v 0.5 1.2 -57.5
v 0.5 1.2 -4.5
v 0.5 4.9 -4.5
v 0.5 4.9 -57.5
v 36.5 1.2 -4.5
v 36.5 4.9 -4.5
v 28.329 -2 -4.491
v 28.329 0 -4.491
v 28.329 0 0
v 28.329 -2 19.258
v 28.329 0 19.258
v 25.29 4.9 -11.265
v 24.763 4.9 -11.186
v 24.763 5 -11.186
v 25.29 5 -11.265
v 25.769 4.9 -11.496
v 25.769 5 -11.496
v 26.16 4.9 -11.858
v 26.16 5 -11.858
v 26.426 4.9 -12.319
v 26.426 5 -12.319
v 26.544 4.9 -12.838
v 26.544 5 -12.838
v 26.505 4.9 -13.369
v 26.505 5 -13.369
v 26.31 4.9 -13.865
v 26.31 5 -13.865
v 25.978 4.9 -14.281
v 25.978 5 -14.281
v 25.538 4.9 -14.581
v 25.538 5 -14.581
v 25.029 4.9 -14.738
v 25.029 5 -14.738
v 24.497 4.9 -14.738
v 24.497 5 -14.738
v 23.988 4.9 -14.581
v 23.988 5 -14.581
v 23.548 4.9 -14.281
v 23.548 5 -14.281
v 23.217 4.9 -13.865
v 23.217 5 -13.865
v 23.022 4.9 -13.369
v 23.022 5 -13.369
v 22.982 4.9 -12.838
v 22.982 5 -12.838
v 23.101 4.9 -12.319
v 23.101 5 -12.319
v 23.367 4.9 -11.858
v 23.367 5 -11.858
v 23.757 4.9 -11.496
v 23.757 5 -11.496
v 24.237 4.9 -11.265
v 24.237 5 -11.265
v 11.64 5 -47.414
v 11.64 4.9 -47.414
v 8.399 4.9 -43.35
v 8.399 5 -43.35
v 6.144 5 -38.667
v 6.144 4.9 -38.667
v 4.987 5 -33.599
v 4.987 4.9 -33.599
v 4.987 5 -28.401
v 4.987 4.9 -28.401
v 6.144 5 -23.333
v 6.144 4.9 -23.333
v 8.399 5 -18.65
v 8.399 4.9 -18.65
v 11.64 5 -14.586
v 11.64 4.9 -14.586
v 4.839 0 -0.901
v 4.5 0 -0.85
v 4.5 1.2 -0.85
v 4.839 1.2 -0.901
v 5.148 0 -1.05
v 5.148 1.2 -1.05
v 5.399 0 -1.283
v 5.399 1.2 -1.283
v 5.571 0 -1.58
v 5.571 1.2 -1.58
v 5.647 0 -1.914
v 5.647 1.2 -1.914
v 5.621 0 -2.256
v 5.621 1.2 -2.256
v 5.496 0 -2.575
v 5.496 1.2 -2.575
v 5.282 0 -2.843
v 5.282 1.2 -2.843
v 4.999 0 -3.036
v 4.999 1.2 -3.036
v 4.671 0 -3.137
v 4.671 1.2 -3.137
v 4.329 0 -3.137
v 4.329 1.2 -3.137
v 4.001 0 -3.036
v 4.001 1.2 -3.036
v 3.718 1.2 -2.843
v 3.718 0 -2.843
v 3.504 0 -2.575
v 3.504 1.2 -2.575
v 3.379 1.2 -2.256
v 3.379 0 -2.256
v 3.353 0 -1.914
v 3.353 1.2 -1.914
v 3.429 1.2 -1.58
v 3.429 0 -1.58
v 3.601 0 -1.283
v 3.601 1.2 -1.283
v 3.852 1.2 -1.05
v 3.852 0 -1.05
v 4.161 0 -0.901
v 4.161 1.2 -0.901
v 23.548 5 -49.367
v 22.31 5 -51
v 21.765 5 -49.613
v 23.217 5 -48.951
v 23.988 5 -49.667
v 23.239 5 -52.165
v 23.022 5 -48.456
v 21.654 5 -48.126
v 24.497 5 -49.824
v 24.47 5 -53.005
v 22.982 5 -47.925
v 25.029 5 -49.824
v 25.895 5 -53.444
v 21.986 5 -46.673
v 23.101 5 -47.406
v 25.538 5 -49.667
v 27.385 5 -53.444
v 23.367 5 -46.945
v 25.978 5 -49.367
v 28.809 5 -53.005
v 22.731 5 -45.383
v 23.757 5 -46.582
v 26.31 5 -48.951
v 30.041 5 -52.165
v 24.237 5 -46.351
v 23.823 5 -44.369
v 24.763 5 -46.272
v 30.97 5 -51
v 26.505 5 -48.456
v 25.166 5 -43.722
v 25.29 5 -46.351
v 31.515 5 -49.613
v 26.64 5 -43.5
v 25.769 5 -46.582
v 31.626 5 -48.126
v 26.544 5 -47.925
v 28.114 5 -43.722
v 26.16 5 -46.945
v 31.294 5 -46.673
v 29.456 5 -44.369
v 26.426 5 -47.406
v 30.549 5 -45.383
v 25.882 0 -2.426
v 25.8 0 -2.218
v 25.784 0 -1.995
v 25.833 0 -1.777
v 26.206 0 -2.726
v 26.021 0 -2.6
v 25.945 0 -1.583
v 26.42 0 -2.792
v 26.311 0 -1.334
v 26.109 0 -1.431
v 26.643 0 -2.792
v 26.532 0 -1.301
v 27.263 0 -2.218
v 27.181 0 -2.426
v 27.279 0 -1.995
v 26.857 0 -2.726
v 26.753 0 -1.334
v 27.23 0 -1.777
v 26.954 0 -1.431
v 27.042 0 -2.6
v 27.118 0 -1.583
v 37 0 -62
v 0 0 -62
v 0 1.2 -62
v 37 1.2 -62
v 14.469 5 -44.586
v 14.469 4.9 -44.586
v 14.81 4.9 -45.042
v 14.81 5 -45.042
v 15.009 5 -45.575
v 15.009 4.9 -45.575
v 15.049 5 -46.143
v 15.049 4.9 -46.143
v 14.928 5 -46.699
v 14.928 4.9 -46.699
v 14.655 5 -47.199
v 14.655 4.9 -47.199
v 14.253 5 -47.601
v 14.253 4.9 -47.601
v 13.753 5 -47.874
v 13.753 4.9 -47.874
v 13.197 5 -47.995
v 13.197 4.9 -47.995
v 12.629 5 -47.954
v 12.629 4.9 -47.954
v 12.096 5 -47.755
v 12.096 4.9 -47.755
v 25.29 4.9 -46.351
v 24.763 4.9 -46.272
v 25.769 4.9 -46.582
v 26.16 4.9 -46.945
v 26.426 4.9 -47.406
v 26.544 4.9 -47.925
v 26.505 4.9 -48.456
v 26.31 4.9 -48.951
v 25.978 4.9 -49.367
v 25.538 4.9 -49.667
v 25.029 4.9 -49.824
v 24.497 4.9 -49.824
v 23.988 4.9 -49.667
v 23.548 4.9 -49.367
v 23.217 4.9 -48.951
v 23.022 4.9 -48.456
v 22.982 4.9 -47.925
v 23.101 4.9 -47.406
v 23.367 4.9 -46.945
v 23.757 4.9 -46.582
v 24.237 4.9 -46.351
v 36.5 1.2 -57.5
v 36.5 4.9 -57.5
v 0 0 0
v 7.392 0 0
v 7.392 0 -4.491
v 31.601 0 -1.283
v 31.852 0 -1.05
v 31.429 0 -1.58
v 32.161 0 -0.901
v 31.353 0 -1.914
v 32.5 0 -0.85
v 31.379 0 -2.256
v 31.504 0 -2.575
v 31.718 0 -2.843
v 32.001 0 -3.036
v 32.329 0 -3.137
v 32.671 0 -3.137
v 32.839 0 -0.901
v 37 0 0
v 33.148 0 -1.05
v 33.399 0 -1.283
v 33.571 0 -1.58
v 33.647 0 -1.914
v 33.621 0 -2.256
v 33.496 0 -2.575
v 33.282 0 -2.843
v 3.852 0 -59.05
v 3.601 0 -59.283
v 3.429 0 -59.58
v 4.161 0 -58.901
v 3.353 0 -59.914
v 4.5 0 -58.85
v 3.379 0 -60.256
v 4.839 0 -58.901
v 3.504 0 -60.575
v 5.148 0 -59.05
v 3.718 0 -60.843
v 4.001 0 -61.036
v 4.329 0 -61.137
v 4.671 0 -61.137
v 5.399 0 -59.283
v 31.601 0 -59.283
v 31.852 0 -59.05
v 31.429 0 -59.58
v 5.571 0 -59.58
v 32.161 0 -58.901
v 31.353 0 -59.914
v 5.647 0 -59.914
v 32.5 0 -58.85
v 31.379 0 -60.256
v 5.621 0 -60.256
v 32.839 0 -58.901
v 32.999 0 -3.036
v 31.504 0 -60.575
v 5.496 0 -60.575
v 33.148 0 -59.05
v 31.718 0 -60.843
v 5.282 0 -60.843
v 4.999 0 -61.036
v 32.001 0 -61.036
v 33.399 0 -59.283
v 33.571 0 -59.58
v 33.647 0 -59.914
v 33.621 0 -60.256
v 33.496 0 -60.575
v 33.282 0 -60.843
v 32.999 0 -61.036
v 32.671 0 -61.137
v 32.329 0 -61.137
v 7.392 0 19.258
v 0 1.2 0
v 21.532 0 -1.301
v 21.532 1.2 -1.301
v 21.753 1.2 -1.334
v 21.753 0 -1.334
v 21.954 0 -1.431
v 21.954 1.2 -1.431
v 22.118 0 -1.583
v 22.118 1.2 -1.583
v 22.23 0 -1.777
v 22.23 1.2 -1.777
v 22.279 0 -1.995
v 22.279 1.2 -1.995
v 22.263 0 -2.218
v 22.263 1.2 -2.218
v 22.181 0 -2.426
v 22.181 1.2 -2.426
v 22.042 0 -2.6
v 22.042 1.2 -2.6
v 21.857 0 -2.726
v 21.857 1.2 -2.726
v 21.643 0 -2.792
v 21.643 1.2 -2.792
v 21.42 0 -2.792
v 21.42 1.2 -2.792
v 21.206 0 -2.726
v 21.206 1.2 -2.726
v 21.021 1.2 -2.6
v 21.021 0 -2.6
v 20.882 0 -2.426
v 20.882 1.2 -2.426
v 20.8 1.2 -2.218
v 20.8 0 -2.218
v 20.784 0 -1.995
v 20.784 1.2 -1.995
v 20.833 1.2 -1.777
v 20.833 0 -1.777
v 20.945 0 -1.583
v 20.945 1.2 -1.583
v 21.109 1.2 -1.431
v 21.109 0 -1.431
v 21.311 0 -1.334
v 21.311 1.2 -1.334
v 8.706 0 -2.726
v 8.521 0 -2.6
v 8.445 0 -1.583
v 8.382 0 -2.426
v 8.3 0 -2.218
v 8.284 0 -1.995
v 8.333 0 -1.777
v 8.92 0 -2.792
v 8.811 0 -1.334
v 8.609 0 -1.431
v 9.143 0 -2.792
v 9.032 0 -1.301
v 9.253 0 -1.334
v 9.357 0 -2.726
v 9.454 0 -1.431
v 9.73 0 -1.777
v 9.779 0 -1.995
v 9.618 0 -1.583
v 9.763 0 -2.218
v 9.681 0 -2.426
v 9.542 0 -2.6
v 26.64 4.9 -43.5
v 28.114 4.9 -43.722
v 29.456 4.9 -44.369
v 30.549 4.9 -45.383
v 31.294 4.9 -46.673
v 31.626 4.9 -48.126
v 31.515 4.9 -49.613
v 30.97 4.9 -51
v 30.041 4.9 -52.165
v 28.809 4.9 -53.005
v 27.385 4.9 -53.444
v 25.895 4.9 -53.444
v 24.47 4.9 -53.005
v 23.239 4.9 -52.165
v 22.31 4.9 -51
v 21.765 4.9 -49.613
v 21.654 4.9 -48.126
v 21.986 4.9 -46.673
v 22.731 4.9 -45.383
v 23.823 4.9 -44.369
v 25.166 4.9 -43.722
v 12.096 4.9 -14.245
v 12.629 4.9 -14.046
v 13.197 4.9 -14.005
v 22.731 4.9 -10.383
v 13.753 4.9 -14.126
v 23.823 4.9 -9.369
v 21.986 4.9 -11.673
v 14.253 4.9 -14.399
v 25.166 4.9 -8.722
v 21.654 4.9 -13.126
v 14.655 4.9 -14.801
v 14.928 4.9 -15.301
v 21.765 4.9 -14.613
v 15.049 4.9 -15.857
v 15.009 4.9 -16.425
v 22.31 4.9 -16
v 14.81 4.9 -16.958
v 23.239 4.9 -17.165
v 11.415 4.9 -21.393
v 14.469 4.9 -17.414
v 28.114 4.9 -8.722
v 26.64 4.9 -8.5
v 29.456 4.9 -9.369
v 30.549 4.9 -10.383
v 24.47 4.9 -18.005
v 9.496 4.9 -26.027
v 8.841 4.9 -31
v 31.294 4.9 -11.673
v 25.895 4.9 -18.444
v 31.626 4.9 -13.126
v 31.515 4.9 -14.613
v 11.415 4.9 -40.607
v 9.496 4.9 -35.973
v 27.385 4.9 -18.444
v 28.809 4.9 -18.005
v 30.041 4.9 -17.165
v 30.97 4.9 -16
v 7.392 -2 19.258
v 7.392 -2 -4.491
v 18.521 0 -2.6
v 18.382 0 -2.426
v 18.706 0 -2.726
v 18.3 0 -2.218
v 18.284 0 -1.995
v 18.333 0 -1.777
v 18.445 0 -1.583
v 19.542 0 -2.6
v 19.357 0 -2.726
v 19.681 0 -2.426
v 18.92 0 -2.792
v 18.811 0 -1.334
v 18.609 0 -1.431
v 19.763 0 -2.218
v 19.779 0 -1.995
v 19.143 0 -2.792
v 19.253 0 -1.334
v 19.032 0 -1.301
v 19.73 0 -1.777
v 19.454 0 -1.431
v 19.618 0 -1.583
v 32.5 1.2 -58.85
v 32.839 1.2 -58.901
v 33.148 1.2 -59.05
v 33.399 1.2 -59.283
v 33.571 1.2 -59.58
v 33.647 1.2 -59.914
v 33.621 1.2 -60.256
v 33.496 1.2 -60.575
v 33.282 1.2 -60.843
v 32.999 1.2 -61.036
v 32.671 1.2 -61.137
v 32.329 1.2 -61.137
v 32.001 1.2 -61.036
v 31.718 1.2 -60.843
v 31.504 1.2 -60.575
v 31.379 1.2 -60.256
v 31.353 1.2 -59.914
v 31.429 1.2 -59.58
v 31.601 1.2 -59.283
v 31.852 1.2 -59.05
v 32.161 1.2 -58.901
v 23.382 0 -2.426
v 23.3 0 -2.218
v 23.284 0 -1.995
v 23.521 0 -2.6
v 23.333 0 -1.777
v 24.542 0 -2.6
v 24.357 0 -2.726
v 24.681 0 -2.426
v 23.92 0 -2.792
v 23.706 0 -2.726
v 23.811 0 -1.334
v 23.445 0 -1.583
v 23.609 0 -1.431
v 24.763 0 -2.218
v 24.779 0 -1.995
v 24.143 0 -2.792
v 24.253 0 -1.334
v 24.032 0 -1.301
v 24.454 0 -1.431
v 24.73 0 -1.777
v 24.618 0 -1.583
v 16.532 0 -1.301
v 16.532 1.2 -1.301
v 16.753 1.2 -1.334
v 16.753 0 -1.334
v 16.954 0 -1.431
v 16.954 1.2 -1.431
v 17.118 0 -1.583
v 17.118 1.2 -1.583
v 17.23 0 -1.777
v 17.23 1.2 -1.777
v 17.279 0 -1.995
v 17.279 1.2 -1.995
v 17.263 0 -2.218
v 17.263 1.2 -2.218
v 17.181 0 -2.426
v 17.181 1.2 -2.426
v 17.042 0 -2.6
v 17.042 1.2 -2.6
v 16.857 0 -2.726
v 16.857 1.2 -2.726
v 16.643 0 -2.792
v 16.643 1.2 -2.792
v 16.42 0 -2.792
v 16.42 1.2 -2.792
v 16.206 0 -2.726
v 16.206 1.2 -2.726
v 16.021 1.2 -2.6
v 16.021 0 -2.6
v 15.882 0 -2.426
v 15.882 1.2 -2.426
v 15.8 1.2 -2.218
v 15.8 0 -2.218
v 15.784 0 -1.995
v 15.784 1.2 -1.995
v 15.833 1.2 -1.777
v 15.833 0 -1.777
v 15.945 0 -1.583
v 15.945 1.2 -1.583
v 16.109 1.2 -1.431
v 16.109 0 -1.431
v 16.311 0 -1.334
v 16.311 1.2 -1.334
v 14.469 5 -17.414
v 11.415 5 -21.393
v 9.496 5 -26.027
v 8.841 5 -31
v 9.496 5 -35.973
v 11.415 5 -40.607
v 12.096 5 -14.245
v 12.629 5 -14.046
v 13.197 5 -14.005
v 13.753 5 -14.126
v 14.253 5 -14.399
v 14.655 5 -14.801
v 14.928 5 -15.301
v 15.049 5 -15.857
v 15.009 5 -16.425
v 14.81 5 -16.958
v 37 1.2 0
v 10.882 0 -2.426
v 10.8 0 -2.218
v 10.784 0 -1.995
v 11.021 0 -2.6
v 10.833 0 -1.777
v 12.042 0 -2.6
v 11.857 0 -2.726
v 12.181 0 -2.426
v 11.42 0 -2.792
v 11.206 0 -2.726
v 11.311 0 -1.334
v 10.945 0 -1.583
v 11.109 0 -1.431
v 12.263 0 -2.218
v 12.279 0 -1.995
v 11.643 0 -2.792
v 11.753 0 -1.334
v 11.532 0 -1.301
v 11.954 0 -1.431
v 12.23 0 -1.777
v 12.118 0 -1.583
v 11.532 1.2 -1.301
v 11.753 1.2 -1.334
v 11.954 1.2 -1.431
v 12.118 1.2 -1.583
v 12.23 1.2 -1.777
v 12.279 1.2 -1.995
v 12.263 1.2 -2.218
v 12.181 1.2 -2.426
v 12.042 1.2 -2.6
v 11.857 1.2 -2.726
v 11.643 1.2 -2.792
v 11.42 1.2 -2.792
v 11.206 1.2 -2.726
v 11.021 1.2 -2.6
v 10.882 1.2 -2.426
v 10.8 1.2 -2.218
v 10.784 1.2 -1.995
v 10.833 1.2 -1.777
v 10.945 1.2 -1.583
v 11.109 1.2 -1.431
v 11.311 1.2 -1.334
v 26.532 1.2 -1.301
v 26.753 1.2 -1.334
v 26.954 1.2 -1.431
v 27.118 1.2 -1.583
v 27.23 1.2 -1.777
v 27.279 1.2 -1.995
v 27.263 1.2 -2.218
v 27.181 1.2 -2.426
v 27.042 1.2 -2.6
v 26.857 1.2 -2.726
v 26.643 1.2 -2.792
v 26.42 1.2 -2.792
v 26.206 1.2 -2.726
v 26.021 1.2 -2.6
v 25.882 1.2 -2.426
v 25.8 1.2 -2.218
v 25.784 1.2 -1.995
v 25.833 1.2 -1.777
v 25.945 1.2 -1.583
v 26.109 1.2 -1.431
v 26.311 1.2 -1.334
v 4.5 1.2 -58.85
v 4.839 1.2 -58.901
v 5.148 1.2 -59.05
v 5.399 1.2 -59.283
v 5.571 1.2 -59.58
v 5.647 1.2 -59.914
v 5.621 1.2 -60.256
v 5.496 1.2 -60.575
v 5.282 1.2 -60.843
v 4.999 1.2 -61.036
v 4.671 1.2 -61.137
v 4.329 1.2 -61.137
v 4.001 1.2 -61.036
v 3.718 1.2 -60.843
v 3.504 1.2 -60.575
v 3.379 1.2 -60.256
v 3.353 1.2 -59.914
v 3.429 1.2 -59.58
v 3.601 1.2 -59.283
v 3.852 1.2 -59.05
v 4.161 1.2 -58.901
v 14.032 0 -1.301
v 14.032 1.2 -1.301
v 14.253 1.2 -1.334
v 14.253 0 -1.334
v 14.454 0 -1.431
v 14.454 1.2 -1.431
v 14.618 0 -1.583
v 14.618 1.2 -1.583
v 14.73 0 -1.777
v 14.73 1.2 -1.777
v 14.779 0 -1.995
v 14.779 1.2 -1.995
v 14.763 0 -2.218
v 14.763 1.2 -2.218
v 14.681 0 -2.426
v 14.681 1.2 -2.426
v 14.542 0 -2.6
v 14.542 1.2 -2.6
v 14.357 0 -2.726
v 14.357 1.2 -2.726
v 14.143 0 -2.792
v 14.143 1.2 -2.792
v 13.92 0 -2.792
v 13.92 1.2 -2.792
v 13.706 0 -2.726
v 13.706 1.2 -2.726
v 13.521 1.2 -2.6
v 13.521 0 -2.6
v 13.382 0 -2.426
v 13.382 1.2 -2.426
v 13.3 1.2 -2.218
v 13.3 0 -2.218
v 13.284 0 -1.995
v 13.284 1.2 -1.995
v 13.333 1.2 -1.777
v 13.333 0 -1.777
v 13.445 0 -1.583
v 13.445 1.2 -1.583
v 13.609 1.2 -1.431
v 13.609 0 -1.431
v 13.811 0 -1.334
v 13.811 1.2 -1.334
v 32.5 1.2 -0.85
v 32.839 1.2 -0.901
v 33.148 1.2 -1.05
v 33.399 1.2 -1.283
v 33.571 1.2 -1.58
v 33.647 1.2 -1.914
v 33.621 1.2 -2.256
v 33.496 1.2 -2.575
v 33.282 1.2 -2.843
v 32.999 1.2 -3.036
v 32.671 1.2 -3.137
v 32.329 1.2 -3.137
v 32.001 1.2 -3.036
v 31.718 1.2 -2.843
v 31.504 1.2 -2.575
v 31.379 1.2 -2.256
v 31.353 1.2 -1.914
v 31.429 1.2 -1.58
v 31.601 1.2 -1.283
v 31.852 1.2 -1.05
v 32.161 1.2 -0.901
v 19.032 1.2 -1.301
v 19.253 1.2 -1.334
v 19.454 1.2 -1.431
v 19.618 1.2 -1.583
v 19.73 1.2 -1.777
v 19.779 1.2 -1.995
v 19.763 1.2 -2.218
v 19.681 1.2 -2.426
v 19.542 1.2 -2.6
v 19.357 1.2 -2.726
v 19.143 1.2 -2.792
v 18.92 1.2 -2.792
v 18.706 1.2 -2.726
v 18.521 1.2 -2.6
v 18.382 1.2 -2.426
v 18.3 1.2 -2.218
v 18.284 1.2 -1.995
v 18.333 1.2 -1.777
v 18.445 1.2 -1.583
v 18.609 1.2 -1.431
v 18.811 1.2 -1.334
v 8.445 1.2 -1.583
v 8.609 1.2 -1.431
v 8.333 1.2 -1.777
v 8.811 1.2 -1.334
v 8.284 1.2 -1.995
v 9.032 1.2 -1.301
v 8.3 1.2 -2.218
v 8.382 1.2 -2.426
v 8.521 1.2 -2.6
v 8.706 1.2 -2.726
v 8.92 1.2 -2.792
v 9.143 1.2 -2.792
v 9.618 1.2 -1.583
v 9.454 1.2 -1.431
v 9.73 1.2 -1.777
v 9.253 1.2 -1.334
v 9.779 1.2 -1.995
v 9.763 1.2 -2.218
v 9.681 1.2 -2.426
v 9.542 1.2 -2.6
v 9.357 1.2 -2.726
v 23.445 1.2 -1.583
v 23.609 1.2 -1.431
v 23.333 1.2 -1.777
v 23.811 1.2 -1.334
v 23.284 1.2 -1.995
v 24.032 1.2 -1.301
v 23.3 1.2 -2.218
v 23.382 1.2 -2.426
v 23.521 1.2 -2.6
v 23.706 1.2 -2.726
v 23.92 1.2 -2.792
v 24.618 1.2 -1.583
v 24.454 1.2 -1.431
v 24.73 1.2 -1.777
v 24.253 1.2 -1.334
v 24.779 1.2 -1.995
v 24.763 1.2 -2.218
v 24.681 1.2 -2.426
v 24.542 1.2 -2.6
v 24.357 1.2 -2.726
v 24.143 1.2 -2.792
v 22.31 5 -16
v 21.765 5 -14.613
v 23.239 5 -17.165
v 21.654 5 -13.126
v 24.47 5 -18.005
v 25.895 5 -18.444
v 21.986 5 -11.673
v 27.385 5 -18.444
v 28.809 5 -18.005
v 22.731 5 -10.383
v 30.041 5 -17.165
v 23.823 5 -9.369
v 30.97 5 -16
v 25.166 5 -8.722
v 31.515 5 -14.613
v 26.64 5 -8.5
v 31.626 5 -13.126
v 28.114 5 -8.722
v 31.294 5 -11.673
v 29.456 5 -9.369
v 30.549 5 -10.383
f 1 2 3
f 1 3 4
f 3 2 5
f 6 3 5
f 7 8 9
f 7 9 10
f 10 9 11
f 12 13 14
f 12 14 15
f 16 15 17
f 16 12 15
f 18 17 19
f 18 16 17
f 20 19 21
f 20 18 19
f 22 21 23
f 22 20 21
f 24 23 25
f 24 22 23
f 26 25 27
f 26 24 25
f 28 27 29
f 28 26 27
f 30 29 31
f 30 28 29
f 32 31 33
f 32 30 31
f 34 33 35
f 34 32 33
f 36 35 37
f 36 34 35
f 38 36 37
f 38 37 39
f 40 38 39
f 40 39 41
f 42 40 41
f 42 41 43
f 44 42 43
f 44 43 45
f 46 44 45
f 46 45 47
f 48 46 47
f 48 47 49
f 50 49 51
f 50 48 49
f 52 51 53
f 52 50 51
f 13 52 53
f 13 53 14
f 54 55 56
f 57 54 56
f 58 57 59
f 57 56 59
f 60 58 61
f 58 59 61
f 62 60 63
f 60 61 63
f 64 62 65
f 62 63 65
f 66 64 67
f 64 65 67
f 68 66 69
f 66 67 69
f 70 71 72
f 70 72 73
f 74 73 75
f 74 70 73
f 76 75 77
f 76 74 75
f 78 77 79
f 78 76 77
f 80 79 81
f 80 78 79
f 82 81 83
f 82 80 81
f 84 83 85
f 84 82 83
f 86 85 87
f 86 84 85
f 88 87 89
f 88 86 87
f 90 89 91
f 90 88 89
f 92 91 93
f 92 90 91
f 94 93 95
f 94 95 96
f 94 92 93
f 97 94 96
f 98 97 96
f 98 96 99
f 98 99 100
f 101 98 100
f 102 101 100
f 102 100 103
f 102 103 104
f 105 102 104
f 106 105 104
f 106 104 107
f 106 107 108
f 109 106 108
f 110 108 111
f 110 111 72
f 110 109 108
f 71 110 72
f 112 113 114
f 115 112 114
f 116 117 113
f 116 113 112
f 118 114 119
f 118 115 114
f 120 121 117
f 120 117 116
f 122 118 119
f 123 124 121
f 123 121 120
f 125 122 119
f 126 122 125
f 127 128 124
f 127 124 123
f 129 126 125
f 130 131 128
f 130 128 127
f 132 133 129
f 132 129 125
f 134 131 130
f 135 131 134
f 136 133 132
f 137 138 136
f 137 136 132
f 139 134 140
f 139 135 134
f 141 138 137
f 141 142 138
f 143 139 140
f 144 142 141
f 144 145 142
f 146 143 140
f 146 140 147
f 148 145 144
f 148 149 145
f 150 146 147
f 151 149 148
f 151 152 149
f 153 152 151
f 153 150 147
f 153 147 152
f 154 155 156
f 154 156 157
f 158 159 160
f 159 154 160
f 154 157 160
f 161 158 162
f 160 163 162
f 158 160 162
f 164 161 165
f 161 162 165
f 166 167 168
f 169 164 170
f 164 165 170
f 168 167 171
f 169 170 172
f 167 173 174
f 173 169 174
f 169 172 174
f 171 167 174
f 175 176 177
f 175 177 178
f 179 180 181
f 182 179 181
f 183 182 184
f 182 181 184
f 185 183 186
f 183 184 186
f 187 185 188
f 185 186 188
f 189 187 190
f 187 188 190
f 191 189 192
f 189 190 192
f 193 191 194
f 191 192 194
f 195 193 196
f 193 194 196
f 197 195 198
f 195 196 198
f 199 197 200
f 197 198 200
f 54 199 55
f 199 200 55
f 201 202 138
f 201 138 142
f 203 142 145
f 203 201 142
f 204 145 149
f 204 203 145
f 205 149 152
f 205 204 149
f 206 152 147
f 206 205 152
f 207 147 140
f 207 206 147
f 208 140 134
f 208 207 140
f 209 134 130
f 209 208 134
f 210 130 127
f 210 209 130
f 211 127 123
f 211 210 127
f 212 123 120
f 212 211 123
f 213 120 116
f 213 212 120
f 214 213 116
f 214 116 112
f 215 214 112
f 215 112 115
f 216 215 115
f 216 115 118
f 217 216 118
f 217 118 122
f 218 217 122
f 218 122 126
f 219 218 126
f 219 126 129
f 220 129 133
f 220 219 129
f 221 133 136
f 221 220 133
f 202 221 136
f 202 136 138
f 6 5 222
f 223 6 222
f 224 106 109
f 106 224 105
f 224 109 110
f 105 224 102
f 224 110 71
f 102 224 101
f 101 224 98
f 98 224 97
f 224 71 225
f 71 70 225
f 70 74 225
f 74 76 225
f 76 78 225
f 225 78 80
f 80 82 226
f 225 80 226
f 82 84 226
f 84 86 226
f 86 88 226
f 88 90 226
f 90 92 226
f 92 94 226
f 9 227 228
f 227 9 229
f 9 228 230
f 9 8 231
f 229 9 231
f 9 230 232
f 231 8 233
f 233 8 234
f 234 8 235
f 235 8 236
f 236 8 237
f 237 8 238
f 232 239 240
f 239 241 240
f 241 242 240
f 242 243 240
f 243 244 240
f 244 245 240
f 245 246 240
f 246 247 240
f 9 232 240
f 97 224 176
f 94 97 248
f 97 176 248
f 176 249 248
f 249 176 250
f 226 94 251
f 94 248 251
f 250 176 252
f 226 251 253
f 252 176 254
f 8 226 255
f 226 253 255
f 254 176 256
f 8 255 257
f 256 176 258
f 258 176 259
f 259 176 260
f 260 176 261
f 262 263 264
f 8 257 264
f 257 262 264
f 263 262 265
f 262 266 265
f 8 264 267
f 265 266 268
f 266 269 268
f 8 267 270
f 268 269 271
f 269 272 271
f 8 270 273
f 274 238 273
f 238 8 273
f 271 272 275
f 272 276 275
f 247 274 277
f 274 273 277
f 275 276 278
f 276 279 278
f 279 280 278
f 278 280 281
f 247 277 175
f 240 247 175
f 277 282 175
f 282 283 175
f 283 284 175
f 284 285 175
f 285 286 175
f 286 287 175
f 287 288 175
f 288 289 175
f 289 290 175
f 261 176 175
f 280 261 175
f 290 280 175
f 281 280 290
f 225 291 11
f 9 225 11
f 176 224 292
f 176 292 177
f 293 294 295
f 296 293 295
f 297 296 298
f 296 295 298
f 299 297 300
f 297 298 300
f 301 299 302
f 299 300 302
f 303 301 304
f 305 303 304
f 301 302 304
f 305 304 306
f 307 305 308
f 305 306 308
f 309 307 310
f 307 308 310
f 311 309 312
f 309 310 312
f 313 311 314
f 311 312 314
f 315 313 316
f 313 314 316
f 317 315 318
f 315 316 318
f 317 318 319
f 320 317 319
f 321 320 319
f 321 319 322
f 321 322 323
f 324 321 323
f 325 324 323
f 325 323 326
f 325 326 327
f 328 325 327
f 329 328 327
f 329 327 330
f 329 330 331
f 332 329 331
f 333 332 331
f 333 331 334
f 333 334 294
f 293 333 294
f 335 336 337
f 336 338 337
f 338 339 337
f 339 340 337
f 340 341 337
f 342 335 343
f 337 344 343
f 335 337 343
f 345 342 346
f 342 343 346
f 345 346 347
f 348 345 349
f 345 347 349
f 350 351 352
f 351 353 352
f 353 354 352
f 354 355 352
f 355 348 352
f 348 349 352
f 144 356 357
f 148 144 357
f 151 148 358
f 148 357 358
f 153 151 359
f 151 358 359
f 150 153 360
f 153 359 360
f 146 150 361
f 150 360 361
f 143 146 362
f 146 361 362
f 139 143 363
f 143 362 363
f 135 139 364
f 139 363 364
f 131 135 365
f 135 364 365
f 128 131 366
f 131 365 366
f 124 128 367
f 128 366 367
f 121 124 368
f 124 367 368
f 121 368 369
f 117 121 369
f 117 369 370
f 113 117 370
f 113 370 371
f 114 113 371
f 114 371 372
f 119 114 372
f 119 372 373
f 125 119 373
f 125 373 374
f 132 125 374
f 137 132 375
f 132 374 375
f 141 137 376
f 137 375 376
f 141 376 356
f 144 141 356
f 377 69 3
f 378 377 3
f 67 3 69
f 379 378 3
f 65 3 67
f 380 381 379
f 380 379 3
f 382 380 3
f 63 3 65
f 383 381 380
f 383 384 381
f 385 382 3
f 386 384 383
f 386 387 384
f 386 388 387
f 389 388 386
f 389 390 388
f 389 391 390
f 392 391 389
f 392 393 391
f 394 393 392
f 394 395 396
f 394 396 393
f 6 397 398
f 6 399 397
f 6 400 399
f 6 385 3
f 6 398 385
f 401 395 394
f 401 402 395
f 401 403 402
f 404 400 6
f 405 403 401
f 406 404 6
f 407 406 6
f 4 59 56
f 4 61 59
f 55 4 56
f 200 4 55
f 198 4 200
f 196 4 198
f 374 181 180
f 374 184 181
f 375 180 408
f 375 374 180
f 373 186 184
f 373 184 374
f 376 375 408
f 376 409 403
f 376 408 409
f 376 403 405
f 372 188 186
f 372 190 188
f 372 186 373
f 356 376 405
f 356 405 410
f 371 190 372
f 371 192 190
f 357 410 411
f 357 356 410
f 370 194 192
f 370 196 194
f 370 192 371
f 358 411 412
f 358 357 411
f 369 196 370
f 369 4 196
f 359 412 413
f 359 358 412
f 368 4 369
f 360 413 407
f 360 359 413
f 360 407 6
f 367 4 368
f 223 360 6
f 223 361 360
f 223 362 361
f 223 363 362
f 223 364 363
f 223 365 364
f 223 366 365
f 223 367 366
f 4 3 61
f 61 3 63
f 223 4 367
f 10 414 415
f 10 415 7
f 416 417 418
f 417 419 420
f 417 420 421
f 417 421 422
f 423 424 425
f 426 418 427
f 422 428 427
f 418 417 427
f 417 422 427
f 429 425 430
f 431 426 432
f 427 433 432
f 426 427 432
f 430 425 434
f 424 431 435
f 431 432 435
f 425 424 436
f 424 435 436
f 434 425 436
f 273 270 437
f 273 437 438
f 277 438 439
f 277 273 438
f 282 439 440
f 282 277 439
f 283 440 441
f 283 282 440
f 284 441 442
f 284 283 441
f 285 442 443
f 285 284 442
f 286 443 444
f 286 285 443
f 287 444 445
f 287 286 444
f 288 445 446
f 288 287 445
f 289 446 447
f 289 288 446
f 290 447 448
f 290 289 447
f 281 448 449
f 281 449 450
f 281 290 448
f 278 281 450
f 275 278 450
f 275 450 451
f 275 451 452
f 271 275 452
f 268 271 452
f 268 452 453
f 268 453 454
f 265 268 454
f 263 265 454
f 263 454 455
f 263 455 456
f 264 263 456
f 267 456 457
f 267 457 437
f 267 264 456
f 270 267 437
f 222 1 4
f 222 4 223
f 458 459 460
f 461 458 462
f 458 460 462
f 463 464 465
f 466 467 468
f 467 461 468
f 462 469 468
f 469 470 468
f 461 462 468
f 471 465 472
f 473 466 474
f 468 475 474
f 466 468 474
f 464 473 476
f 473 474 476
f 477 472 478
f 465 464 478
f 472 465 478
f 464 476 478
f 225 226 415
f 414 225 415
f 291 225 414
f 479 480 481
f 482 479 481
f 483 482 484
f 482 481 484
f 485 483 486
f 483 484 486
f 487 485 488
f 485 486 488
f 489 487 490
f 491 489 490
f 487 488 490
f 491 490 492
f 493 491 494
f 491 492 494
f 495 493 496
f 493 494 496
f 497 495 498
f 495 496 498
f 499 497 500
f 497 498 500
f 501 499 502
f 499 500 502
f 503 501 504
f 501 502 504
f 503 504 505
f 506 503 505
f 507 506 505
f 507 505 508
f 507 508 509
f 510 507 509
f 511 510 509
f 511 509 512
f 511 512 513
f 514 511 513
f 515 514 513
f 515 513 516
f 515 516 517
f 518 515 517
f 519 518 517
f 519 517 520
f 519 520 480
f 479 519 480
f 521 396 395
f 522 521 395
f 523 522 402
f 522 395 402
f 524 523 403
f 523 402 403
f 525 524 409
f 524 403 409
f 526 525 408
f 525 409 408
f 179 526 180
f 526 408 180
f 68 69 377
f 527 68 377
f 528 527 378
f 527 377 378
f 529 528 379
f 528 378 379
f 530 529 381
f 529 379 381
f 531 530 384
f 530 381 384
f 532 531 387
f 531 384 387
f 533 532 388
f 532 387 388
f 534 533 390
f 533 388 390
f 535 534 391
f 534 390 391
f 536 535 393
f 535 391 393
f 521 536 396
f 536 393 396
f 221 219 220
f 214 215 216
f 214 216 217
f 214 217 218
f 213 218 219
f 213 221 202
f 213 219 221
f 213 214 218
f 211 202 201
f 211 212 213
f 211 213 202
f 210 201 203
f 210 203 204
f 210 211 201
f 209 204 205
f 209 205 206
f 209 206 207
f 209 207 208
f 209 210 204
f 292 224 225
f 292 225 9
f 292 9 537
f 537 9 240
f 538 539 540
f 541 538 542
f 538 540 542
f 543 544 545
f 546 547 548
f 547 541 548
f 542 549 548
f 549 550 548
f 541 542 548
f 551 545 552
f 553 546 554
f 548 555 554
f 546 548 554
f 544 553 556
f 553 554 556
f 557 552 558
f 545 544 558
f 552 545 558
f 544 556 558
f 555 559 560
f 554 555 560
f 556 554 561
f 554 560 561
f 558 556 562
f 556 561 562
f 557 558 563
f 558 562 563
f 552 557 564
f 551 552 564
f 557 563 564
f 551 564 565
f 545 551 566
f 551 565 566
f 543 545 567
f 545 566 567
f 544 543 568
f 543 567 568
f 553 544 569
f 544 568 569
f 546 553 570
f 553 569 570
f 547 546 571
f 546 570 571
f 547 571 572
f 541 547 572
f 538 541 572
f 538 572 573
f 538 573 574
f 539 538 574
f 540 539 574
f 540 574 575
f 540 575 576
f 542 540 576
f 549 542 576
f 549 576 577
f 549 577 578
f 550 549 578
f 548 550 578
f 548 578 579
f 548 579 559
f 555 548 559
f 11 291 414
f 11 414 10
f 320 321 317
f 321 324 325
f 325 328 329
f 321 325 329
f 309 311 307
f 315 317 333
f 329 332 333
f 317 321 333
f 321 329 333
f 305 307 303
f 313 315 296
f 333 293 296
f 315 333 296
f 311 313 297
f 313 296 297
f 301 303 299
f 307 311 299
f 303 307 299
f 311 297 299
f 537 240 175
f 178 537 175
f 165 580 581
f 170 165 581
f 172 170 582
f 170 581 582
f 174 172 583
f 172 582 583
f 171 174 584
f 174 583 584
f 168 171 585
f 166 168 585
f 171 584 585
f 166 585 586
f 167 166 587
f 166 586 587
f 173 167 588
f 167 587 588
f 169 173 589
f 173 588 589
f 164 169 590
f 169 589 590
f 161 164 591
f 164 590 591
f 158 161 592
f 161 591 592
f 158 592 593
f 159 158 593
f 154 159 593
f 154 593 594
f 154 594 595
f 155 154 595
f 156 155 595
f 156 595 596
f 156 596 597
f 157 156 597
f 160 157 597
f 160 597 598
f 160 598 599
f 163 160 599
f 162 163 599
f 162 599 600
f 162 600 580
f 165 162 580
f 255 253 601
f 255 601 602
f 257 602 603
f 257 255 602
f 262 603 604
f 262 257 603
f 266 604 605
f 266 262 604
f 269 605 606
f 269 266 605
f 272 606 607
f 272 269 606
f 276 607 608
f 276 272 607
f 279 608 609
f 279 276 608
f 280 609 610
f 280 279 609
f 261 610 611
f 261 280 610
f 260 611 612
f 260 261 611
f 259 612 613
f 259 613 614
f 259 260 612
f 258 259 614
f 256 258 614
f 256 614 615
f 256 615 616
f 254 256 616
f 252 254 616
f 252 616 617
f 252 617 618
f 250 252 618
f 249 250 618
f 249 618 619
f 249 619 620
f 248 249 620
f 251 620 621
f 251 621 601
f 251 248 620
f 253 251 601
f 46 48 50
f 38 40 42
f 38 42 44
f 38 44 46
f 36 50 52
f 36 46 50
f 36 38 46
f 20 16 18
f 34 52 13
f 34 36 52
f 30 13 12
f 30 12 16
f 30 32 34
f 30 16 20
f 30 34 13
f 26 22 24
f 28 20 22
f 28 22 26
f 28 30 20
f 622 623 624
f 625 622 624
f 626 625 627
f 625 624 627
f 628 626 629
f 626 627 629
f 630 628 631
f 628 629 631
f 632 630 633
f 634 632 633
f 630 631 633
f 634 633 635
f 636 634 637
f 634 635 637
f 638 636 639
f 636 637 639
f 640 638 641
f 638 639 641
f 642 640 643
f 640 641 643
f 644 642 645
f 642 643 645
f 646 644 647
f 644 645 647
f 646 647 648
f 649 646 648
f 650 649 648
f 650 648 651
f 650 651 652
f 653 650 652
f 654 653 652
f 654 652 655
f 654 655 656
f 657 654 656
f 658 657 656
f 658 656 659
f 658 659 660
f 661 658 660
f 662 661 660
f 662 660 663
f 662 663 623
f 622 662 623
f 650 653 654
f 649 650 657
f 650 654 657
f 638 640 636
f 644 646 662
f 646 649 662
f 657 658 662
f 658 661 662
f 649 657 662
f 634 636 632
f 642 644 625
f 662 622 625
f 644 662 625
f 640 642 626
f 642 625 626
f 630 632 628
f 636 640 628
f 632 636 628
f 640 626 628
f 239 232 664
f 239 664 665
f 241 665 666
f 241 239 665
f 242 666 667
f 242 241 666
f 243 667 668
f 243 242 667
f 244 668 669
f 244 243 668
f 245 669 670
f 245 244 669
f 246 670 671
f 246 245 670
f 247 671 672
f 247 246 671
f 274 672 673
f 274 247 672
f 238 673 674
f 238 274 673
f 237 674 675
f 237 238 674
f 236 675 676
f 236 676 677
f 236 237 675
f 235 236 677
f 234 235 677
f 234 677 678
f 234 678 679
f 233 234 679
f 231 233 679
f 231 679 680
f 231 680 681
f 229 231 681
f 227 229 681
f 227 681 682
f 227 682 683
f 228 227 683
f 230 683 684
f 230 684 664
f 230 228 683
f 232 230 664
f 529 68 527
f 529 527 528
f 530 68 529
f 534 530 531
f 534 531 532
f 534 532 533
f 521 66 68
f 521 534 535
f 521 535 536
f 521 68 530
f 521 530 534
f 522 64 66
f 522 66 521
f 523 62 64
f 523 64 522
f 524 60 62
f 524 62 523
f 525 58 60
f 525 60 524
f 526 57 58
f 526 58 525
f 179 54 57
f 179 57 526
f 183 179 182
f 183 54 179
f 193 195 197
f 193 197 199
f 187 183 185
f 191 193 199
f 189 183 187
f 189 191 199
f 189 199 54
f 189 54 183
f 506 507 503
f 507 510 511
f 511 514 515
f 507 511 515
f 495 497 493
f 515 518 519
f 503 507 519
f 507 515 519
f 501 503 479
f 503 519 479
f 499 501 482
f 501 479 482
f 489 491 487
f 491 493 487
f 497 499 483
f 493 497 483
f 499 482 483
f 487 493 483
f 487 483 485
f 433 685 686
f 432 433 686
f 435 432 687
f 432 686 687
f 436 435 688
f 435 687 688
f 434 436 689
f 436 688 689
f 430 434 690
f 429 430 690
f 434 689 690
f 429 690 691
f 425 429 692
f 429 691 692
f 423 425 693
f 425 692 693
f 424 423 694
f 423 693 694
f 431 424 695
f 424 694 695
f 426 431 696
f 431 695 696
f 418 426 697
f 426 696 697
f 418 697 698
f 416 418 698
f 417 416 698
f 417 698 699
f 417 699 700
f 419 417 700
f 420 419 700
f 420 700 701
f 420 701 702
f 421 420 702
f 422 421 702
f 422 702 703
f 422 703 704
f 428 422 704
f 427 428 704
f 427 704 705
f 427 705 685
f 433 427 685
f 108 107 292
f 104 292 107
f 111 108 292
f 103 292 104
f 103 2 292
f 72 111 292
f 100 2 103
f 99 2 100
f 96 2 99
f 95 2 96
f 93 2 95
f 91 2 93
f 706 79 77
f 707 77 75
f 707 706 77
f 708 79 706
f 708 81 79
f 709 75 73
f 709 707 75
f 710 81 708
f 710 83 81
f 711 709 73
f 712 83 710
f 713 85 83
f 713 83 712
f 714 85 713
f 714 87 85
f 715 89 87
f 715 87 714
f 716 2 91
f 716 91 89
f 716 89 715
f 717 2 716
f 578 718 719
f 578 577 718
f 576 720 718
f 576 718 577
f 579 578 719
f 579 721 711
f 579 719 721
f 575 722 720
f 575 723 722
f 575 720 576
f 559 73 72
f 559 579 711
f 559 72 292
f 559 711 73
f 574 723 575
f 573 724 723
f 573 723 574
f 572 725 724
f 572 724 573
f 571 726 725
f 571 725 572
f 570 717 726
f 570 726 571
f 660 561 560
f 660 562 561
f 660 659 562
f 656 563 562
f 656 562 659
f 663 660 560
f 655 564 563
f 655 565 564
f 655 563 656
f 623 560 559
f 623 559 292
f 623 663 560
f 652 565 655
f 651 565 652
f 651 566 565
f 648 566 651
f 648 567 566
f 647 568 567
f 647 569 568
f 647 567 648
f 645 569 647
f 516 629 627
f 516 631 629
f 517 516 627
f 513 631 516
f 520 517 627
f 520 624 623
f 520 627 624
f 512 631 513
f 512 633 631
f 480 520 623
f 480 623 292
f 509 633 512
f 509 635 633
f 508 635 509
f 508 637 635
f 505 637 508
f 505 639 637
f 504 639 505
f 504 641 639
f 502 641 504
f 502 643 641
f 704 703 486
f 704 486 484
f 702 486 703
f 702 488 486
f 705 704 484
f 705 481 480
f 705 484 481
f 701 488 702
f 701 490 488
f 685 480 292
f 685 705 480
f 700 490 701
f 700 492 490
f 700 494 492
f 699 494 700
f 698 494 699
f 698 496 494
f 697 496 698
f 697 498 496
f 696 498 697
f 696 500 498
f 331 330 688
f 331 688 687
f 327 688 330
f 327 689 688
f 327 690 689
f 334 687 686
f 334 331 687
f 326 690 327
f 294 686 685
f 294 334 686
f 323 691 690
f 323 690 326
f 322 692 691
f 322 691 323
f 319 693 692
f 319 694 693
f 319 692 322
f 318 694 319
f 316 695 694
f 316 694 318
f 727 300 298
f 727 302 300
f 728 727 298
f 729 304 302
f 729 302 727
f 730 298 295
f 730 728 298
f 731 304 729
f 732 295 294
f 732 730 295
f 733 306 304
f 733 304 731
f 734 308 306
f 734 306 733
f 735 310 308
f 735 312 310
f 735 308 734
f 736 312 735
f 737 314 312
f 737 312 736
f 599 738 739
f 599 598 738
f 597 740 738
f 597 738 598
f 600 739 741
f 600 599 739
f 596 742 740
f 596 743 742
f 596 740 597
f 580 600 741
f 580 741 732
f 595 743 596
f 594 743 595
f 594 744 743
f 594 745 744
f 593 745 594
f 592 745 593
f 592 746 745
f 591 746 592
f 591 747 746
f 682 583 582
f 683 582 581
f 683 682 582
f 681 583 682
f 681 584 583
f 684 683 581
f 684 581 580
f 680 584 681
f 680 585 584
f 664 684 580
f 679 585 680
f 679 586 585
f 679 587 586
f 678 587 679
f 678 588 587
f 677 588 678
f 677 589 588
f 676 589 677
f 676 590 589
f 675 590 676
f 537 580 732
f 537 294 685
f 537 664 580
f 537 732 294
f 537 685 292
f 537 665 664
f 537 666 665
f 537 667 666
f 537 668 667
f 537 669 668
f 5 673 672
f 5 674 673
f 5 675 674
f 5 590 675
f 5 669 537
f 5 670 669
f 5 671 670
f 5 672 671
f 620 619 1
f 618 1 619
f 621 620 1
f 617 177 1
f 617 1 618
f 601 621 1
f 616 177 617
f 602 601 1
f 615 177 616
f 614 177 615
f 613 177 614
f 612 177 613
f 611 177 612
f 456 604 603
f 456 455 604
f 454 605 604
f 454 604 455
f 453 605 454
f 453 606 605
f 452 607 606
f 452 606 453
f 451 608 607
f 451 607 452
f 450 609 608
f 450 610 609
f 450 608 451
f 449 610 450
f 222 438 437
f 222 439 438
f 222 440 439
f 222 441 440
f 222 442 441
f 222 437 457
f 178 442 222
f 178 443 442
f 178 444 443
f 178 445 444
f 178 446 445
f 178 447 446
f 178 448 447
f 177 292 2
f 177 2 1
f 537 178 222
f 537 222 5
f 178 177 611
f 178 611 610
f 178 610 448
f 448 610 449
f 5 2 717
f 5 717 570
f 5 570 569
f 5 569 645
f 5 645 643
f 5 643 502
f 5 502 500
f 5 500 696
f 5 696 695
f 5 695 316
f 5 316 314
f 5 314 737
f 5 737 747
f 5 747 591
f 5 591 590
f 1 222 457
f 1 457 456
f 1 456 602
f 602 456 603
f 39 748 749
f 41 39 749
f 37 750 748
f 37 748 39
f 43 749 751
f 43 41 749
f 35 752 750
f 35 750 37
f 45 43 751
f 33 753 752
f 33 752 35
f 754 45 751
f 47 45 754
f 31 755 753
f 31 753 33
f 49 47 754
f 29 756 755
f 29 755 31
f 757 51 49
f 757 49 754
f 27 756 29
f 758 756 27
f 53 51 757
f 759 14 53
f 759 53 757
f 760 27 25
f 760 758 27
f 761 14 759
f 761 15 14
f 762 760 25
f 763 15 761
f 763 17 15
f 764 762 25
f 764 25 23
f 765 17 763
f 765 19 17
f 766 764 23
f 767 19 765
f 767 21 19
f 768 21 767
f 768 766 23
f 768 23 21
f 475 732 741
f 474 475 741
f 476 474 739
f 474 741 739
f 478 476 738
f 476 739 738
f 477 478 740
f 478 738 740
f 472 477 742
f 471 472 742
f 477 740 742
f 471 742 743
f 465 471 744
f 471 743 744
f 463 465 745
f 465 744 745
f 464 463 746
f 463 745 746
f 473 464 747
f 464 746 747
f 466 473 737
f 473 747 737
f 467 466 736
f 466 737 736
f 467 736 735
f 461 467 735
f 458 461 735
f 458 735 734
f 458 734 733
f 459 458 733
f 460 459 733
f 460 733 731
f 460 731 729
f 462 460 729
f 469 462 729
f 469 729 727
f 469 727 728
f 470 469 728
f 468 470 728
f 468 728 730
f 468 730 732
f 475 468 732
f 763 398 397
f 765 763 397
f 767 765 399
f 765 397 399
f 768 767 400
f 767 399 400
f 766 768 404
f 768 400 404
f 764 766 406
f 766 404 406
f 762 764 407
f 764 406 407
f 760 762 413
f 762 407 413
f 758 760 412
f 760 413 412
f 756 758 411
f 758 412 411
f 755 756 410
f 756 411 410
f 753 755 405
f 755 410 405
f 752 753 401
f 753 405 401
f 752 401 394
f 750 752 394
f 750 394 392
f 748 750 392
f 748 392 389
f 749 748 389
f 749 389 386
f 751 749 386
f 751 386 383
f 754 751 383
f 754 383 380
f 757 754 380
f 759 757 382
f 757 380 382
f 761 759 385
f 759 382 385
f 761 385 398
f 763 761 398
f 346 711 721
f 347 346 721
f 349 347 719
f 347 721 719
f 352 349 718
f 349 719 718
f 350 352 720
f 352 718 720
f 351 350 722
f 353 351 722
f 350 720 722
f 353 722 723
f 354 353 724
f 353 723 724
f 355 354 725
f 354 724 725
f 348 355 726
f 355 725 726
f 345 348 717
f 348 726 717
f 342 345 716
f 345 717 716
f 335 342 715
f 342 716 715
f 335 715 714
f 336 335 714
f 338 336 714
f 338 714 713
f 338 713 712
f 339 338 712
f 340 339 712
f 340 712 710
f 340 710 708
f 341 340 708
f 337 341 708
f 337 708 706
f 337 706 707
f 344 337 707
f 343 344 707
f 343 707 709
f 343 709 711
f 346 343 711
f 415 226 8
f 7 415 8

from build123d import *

# Parameters (mm, degrees)
SKETCH1_W           = 37
SKETCH1_H           = 62
SKETCH1_R           = 1.15
BOSS_EXTRUDE1_DEPTH = 1.2
SKETCH2_W           = 36
SKETCH2_H           = 53
BOSS_EXTRUDE2_DEPTH = 3.7
SKETCH3_R           = 0.75
CUT_EXTRUDE1_DEPTH  = 73.295850503
SKETCH4_R           = 5
SKETCH4_R_2         = 1.786053174
BOSS_EXTRUDE3_DEPTH = 0.1
SKETCH5_W           = 20.937122204
SKETCH5_H           = 23.749430493
BOSS_EXTRUDE4_DEPTH = 2


with BuildPart() as part:
    # Sketch1 → Boss-Extrude1 (new body)
    with BuildSketch(Plane(origin=(0, 0, 0), x_dir=(1, 0, 0), z_dir=(0, 1, 0))):
        with Locations((18.5, 31)):
            Rectangle(SKETCH1_W, SKETCH1_H)
        with Locations(Location((32.5, 60, 0), (0, 0, 270))):
            Circle(SKETCH1_R, mode=Mode.SUBTRACT)
        with Locations(Location((4.5, 60, 0), (0, 0, 270))):
            Circle(SKETCH1_R, mode=Mode.SUBTRACT)
        with Locations(Location((32.5, 2, 0), (0, 0, 270))):
            Circle(SKETCH1_R, mode=Mode.SUBTRACT)
        with Locations(Location((4.5, 2, 0), (0, 0, 270))):
            Circle(SKETCH1_R, mode=Mode.SUBTRACT)
    extrude(amount=BOSS_EXTRUDE1_DEPTH)

    # Sketch2 → Boss-Extrude2 (add)
    with BuildSketch(Plane(origin=(0, 1.2, 0), x_dir=(1, 0, 0), z_dir=(0, 1, 0))):
        with Locations((18.5, 31)):
            Rectangle(SKETCH2_W, SKETCH2_H)
    extrude(amount=BOSS_EXTRUDE2_DEPTH)

    # Sketch3 → Cut-Extrude1 (cut, through all)
    with BuildSketch(Plane(origin=(0, 1.2, 0), x_dir=(1, 0, 0), z_dir=(0, 1, 0))):
        with Locations(Location((9.031578358, 2.050688375, 0), (0, 0, 270))):
            Circle(SKETCH3_R)
        with Locations(Location((11.531578358, 2.050688375, 0), (0, 0, 270))):
            Circle(SKETCH3_R)
        with Locations(Location((14.031578358, 2.050688375, 0), (0, 0, 270))):
            Circle(SKETCH3_R)
        with Locations(Location((16.531578358, 2.050688375, 0), (0, 0, 270))):
            Circle(SKETCH3_R)
        with Locations(Location((19.031578358, 2.050688375, 0), (0, 0, 270))):
            Circle(SKETCH3_R)
        with Locations(Location((21.531578358, 2.050688375, 0), (0, 0, 270))):
            Circle(SKETCH3_R)
        with Locations(Location((24.031578358, 2.050688375, 0), (0, 0, 270))):
            Circle(SKETCH3_R)
        with Locations(Location((26.531578358, 2.050688375, 0), (0, 0, 270))):
            Circle(SKETCH3_R)
    extrude(amount=-CUT_EXTRUDE1_DEPTH, mode=Mode.SUBTRACT)

    # Sketch4 → Boss-Extrude3 (add)
    # profile 1 of 3: a face of its own
    with BuildSketch(Plane(origin=(0, 4.9, 0), x_dir=(1, 0, 0), z_dir=(0, 1, 0))):
        with Locations(Location((26.639884222, 48.5, 0), (0, 0, 270))):
            Circle(SKETCH4_R)
        with Locations(Location((24.763300075, 48.058155317, 0), (0, 0, 270))):
            Circle(SKETCH4_R_2, mode=Mode.SUBTRACT)
    # profile 2 of 3: a face of its own
    with BuildSketch(Plane(origin=(0, 4.9, 0), x_dir=(1, 0, 0), z_dir=(0, 1, 0))):
        with Locations(Location((26.639884222, 13.5, 0), (0, 0, 270))):
            Circle(SKETCH4_R)
        with Locations(Location((24.763300075, 12.971685579, 0), (0, 0, 270))):
            Circle(SKETCH4_R_2, mode=Mode.SUBTRACT)
    # profile 3 of 3: a face of its own
    with BuildSketch(Plane(origin=(0, 4.9, 0), x_dir=(1, 0, 0), z_dir=(0, 1, 0))):
        with BuildLine():
            ThreePointArc((11.640146641, 47.414213562), (4.841156768, 31), (11.640146641, 14.585786438))
            ThreePointArc((11.640146641, 14.585786438), (14.468573766, 14.585786438), (14.468573766, 17.414213562))
            ThreePointArc((14.468573766, 17.414213562), (8.841156768, 31), (14.468573766, 44.585786438))
            ThreePointArc((14.468573766, 44.585786438), (14.468573766, 47.414213562), (11.640146641, 47.414213562))
        make_face()
    extrude(amount=BOSS_EXTRUDE3_DEPTH)

    # Sketch5 → Boss-Extrude4 (add)
    with BuildSketch(Plane.XZ):
        with Locations((17.860565838, 7.383650804)):
            Rectangle(SKETCH5_W, SKETCH5_H)
    extrude(amount=BOSS_EXTRUDE4_DEPTH)


solid = part.part
